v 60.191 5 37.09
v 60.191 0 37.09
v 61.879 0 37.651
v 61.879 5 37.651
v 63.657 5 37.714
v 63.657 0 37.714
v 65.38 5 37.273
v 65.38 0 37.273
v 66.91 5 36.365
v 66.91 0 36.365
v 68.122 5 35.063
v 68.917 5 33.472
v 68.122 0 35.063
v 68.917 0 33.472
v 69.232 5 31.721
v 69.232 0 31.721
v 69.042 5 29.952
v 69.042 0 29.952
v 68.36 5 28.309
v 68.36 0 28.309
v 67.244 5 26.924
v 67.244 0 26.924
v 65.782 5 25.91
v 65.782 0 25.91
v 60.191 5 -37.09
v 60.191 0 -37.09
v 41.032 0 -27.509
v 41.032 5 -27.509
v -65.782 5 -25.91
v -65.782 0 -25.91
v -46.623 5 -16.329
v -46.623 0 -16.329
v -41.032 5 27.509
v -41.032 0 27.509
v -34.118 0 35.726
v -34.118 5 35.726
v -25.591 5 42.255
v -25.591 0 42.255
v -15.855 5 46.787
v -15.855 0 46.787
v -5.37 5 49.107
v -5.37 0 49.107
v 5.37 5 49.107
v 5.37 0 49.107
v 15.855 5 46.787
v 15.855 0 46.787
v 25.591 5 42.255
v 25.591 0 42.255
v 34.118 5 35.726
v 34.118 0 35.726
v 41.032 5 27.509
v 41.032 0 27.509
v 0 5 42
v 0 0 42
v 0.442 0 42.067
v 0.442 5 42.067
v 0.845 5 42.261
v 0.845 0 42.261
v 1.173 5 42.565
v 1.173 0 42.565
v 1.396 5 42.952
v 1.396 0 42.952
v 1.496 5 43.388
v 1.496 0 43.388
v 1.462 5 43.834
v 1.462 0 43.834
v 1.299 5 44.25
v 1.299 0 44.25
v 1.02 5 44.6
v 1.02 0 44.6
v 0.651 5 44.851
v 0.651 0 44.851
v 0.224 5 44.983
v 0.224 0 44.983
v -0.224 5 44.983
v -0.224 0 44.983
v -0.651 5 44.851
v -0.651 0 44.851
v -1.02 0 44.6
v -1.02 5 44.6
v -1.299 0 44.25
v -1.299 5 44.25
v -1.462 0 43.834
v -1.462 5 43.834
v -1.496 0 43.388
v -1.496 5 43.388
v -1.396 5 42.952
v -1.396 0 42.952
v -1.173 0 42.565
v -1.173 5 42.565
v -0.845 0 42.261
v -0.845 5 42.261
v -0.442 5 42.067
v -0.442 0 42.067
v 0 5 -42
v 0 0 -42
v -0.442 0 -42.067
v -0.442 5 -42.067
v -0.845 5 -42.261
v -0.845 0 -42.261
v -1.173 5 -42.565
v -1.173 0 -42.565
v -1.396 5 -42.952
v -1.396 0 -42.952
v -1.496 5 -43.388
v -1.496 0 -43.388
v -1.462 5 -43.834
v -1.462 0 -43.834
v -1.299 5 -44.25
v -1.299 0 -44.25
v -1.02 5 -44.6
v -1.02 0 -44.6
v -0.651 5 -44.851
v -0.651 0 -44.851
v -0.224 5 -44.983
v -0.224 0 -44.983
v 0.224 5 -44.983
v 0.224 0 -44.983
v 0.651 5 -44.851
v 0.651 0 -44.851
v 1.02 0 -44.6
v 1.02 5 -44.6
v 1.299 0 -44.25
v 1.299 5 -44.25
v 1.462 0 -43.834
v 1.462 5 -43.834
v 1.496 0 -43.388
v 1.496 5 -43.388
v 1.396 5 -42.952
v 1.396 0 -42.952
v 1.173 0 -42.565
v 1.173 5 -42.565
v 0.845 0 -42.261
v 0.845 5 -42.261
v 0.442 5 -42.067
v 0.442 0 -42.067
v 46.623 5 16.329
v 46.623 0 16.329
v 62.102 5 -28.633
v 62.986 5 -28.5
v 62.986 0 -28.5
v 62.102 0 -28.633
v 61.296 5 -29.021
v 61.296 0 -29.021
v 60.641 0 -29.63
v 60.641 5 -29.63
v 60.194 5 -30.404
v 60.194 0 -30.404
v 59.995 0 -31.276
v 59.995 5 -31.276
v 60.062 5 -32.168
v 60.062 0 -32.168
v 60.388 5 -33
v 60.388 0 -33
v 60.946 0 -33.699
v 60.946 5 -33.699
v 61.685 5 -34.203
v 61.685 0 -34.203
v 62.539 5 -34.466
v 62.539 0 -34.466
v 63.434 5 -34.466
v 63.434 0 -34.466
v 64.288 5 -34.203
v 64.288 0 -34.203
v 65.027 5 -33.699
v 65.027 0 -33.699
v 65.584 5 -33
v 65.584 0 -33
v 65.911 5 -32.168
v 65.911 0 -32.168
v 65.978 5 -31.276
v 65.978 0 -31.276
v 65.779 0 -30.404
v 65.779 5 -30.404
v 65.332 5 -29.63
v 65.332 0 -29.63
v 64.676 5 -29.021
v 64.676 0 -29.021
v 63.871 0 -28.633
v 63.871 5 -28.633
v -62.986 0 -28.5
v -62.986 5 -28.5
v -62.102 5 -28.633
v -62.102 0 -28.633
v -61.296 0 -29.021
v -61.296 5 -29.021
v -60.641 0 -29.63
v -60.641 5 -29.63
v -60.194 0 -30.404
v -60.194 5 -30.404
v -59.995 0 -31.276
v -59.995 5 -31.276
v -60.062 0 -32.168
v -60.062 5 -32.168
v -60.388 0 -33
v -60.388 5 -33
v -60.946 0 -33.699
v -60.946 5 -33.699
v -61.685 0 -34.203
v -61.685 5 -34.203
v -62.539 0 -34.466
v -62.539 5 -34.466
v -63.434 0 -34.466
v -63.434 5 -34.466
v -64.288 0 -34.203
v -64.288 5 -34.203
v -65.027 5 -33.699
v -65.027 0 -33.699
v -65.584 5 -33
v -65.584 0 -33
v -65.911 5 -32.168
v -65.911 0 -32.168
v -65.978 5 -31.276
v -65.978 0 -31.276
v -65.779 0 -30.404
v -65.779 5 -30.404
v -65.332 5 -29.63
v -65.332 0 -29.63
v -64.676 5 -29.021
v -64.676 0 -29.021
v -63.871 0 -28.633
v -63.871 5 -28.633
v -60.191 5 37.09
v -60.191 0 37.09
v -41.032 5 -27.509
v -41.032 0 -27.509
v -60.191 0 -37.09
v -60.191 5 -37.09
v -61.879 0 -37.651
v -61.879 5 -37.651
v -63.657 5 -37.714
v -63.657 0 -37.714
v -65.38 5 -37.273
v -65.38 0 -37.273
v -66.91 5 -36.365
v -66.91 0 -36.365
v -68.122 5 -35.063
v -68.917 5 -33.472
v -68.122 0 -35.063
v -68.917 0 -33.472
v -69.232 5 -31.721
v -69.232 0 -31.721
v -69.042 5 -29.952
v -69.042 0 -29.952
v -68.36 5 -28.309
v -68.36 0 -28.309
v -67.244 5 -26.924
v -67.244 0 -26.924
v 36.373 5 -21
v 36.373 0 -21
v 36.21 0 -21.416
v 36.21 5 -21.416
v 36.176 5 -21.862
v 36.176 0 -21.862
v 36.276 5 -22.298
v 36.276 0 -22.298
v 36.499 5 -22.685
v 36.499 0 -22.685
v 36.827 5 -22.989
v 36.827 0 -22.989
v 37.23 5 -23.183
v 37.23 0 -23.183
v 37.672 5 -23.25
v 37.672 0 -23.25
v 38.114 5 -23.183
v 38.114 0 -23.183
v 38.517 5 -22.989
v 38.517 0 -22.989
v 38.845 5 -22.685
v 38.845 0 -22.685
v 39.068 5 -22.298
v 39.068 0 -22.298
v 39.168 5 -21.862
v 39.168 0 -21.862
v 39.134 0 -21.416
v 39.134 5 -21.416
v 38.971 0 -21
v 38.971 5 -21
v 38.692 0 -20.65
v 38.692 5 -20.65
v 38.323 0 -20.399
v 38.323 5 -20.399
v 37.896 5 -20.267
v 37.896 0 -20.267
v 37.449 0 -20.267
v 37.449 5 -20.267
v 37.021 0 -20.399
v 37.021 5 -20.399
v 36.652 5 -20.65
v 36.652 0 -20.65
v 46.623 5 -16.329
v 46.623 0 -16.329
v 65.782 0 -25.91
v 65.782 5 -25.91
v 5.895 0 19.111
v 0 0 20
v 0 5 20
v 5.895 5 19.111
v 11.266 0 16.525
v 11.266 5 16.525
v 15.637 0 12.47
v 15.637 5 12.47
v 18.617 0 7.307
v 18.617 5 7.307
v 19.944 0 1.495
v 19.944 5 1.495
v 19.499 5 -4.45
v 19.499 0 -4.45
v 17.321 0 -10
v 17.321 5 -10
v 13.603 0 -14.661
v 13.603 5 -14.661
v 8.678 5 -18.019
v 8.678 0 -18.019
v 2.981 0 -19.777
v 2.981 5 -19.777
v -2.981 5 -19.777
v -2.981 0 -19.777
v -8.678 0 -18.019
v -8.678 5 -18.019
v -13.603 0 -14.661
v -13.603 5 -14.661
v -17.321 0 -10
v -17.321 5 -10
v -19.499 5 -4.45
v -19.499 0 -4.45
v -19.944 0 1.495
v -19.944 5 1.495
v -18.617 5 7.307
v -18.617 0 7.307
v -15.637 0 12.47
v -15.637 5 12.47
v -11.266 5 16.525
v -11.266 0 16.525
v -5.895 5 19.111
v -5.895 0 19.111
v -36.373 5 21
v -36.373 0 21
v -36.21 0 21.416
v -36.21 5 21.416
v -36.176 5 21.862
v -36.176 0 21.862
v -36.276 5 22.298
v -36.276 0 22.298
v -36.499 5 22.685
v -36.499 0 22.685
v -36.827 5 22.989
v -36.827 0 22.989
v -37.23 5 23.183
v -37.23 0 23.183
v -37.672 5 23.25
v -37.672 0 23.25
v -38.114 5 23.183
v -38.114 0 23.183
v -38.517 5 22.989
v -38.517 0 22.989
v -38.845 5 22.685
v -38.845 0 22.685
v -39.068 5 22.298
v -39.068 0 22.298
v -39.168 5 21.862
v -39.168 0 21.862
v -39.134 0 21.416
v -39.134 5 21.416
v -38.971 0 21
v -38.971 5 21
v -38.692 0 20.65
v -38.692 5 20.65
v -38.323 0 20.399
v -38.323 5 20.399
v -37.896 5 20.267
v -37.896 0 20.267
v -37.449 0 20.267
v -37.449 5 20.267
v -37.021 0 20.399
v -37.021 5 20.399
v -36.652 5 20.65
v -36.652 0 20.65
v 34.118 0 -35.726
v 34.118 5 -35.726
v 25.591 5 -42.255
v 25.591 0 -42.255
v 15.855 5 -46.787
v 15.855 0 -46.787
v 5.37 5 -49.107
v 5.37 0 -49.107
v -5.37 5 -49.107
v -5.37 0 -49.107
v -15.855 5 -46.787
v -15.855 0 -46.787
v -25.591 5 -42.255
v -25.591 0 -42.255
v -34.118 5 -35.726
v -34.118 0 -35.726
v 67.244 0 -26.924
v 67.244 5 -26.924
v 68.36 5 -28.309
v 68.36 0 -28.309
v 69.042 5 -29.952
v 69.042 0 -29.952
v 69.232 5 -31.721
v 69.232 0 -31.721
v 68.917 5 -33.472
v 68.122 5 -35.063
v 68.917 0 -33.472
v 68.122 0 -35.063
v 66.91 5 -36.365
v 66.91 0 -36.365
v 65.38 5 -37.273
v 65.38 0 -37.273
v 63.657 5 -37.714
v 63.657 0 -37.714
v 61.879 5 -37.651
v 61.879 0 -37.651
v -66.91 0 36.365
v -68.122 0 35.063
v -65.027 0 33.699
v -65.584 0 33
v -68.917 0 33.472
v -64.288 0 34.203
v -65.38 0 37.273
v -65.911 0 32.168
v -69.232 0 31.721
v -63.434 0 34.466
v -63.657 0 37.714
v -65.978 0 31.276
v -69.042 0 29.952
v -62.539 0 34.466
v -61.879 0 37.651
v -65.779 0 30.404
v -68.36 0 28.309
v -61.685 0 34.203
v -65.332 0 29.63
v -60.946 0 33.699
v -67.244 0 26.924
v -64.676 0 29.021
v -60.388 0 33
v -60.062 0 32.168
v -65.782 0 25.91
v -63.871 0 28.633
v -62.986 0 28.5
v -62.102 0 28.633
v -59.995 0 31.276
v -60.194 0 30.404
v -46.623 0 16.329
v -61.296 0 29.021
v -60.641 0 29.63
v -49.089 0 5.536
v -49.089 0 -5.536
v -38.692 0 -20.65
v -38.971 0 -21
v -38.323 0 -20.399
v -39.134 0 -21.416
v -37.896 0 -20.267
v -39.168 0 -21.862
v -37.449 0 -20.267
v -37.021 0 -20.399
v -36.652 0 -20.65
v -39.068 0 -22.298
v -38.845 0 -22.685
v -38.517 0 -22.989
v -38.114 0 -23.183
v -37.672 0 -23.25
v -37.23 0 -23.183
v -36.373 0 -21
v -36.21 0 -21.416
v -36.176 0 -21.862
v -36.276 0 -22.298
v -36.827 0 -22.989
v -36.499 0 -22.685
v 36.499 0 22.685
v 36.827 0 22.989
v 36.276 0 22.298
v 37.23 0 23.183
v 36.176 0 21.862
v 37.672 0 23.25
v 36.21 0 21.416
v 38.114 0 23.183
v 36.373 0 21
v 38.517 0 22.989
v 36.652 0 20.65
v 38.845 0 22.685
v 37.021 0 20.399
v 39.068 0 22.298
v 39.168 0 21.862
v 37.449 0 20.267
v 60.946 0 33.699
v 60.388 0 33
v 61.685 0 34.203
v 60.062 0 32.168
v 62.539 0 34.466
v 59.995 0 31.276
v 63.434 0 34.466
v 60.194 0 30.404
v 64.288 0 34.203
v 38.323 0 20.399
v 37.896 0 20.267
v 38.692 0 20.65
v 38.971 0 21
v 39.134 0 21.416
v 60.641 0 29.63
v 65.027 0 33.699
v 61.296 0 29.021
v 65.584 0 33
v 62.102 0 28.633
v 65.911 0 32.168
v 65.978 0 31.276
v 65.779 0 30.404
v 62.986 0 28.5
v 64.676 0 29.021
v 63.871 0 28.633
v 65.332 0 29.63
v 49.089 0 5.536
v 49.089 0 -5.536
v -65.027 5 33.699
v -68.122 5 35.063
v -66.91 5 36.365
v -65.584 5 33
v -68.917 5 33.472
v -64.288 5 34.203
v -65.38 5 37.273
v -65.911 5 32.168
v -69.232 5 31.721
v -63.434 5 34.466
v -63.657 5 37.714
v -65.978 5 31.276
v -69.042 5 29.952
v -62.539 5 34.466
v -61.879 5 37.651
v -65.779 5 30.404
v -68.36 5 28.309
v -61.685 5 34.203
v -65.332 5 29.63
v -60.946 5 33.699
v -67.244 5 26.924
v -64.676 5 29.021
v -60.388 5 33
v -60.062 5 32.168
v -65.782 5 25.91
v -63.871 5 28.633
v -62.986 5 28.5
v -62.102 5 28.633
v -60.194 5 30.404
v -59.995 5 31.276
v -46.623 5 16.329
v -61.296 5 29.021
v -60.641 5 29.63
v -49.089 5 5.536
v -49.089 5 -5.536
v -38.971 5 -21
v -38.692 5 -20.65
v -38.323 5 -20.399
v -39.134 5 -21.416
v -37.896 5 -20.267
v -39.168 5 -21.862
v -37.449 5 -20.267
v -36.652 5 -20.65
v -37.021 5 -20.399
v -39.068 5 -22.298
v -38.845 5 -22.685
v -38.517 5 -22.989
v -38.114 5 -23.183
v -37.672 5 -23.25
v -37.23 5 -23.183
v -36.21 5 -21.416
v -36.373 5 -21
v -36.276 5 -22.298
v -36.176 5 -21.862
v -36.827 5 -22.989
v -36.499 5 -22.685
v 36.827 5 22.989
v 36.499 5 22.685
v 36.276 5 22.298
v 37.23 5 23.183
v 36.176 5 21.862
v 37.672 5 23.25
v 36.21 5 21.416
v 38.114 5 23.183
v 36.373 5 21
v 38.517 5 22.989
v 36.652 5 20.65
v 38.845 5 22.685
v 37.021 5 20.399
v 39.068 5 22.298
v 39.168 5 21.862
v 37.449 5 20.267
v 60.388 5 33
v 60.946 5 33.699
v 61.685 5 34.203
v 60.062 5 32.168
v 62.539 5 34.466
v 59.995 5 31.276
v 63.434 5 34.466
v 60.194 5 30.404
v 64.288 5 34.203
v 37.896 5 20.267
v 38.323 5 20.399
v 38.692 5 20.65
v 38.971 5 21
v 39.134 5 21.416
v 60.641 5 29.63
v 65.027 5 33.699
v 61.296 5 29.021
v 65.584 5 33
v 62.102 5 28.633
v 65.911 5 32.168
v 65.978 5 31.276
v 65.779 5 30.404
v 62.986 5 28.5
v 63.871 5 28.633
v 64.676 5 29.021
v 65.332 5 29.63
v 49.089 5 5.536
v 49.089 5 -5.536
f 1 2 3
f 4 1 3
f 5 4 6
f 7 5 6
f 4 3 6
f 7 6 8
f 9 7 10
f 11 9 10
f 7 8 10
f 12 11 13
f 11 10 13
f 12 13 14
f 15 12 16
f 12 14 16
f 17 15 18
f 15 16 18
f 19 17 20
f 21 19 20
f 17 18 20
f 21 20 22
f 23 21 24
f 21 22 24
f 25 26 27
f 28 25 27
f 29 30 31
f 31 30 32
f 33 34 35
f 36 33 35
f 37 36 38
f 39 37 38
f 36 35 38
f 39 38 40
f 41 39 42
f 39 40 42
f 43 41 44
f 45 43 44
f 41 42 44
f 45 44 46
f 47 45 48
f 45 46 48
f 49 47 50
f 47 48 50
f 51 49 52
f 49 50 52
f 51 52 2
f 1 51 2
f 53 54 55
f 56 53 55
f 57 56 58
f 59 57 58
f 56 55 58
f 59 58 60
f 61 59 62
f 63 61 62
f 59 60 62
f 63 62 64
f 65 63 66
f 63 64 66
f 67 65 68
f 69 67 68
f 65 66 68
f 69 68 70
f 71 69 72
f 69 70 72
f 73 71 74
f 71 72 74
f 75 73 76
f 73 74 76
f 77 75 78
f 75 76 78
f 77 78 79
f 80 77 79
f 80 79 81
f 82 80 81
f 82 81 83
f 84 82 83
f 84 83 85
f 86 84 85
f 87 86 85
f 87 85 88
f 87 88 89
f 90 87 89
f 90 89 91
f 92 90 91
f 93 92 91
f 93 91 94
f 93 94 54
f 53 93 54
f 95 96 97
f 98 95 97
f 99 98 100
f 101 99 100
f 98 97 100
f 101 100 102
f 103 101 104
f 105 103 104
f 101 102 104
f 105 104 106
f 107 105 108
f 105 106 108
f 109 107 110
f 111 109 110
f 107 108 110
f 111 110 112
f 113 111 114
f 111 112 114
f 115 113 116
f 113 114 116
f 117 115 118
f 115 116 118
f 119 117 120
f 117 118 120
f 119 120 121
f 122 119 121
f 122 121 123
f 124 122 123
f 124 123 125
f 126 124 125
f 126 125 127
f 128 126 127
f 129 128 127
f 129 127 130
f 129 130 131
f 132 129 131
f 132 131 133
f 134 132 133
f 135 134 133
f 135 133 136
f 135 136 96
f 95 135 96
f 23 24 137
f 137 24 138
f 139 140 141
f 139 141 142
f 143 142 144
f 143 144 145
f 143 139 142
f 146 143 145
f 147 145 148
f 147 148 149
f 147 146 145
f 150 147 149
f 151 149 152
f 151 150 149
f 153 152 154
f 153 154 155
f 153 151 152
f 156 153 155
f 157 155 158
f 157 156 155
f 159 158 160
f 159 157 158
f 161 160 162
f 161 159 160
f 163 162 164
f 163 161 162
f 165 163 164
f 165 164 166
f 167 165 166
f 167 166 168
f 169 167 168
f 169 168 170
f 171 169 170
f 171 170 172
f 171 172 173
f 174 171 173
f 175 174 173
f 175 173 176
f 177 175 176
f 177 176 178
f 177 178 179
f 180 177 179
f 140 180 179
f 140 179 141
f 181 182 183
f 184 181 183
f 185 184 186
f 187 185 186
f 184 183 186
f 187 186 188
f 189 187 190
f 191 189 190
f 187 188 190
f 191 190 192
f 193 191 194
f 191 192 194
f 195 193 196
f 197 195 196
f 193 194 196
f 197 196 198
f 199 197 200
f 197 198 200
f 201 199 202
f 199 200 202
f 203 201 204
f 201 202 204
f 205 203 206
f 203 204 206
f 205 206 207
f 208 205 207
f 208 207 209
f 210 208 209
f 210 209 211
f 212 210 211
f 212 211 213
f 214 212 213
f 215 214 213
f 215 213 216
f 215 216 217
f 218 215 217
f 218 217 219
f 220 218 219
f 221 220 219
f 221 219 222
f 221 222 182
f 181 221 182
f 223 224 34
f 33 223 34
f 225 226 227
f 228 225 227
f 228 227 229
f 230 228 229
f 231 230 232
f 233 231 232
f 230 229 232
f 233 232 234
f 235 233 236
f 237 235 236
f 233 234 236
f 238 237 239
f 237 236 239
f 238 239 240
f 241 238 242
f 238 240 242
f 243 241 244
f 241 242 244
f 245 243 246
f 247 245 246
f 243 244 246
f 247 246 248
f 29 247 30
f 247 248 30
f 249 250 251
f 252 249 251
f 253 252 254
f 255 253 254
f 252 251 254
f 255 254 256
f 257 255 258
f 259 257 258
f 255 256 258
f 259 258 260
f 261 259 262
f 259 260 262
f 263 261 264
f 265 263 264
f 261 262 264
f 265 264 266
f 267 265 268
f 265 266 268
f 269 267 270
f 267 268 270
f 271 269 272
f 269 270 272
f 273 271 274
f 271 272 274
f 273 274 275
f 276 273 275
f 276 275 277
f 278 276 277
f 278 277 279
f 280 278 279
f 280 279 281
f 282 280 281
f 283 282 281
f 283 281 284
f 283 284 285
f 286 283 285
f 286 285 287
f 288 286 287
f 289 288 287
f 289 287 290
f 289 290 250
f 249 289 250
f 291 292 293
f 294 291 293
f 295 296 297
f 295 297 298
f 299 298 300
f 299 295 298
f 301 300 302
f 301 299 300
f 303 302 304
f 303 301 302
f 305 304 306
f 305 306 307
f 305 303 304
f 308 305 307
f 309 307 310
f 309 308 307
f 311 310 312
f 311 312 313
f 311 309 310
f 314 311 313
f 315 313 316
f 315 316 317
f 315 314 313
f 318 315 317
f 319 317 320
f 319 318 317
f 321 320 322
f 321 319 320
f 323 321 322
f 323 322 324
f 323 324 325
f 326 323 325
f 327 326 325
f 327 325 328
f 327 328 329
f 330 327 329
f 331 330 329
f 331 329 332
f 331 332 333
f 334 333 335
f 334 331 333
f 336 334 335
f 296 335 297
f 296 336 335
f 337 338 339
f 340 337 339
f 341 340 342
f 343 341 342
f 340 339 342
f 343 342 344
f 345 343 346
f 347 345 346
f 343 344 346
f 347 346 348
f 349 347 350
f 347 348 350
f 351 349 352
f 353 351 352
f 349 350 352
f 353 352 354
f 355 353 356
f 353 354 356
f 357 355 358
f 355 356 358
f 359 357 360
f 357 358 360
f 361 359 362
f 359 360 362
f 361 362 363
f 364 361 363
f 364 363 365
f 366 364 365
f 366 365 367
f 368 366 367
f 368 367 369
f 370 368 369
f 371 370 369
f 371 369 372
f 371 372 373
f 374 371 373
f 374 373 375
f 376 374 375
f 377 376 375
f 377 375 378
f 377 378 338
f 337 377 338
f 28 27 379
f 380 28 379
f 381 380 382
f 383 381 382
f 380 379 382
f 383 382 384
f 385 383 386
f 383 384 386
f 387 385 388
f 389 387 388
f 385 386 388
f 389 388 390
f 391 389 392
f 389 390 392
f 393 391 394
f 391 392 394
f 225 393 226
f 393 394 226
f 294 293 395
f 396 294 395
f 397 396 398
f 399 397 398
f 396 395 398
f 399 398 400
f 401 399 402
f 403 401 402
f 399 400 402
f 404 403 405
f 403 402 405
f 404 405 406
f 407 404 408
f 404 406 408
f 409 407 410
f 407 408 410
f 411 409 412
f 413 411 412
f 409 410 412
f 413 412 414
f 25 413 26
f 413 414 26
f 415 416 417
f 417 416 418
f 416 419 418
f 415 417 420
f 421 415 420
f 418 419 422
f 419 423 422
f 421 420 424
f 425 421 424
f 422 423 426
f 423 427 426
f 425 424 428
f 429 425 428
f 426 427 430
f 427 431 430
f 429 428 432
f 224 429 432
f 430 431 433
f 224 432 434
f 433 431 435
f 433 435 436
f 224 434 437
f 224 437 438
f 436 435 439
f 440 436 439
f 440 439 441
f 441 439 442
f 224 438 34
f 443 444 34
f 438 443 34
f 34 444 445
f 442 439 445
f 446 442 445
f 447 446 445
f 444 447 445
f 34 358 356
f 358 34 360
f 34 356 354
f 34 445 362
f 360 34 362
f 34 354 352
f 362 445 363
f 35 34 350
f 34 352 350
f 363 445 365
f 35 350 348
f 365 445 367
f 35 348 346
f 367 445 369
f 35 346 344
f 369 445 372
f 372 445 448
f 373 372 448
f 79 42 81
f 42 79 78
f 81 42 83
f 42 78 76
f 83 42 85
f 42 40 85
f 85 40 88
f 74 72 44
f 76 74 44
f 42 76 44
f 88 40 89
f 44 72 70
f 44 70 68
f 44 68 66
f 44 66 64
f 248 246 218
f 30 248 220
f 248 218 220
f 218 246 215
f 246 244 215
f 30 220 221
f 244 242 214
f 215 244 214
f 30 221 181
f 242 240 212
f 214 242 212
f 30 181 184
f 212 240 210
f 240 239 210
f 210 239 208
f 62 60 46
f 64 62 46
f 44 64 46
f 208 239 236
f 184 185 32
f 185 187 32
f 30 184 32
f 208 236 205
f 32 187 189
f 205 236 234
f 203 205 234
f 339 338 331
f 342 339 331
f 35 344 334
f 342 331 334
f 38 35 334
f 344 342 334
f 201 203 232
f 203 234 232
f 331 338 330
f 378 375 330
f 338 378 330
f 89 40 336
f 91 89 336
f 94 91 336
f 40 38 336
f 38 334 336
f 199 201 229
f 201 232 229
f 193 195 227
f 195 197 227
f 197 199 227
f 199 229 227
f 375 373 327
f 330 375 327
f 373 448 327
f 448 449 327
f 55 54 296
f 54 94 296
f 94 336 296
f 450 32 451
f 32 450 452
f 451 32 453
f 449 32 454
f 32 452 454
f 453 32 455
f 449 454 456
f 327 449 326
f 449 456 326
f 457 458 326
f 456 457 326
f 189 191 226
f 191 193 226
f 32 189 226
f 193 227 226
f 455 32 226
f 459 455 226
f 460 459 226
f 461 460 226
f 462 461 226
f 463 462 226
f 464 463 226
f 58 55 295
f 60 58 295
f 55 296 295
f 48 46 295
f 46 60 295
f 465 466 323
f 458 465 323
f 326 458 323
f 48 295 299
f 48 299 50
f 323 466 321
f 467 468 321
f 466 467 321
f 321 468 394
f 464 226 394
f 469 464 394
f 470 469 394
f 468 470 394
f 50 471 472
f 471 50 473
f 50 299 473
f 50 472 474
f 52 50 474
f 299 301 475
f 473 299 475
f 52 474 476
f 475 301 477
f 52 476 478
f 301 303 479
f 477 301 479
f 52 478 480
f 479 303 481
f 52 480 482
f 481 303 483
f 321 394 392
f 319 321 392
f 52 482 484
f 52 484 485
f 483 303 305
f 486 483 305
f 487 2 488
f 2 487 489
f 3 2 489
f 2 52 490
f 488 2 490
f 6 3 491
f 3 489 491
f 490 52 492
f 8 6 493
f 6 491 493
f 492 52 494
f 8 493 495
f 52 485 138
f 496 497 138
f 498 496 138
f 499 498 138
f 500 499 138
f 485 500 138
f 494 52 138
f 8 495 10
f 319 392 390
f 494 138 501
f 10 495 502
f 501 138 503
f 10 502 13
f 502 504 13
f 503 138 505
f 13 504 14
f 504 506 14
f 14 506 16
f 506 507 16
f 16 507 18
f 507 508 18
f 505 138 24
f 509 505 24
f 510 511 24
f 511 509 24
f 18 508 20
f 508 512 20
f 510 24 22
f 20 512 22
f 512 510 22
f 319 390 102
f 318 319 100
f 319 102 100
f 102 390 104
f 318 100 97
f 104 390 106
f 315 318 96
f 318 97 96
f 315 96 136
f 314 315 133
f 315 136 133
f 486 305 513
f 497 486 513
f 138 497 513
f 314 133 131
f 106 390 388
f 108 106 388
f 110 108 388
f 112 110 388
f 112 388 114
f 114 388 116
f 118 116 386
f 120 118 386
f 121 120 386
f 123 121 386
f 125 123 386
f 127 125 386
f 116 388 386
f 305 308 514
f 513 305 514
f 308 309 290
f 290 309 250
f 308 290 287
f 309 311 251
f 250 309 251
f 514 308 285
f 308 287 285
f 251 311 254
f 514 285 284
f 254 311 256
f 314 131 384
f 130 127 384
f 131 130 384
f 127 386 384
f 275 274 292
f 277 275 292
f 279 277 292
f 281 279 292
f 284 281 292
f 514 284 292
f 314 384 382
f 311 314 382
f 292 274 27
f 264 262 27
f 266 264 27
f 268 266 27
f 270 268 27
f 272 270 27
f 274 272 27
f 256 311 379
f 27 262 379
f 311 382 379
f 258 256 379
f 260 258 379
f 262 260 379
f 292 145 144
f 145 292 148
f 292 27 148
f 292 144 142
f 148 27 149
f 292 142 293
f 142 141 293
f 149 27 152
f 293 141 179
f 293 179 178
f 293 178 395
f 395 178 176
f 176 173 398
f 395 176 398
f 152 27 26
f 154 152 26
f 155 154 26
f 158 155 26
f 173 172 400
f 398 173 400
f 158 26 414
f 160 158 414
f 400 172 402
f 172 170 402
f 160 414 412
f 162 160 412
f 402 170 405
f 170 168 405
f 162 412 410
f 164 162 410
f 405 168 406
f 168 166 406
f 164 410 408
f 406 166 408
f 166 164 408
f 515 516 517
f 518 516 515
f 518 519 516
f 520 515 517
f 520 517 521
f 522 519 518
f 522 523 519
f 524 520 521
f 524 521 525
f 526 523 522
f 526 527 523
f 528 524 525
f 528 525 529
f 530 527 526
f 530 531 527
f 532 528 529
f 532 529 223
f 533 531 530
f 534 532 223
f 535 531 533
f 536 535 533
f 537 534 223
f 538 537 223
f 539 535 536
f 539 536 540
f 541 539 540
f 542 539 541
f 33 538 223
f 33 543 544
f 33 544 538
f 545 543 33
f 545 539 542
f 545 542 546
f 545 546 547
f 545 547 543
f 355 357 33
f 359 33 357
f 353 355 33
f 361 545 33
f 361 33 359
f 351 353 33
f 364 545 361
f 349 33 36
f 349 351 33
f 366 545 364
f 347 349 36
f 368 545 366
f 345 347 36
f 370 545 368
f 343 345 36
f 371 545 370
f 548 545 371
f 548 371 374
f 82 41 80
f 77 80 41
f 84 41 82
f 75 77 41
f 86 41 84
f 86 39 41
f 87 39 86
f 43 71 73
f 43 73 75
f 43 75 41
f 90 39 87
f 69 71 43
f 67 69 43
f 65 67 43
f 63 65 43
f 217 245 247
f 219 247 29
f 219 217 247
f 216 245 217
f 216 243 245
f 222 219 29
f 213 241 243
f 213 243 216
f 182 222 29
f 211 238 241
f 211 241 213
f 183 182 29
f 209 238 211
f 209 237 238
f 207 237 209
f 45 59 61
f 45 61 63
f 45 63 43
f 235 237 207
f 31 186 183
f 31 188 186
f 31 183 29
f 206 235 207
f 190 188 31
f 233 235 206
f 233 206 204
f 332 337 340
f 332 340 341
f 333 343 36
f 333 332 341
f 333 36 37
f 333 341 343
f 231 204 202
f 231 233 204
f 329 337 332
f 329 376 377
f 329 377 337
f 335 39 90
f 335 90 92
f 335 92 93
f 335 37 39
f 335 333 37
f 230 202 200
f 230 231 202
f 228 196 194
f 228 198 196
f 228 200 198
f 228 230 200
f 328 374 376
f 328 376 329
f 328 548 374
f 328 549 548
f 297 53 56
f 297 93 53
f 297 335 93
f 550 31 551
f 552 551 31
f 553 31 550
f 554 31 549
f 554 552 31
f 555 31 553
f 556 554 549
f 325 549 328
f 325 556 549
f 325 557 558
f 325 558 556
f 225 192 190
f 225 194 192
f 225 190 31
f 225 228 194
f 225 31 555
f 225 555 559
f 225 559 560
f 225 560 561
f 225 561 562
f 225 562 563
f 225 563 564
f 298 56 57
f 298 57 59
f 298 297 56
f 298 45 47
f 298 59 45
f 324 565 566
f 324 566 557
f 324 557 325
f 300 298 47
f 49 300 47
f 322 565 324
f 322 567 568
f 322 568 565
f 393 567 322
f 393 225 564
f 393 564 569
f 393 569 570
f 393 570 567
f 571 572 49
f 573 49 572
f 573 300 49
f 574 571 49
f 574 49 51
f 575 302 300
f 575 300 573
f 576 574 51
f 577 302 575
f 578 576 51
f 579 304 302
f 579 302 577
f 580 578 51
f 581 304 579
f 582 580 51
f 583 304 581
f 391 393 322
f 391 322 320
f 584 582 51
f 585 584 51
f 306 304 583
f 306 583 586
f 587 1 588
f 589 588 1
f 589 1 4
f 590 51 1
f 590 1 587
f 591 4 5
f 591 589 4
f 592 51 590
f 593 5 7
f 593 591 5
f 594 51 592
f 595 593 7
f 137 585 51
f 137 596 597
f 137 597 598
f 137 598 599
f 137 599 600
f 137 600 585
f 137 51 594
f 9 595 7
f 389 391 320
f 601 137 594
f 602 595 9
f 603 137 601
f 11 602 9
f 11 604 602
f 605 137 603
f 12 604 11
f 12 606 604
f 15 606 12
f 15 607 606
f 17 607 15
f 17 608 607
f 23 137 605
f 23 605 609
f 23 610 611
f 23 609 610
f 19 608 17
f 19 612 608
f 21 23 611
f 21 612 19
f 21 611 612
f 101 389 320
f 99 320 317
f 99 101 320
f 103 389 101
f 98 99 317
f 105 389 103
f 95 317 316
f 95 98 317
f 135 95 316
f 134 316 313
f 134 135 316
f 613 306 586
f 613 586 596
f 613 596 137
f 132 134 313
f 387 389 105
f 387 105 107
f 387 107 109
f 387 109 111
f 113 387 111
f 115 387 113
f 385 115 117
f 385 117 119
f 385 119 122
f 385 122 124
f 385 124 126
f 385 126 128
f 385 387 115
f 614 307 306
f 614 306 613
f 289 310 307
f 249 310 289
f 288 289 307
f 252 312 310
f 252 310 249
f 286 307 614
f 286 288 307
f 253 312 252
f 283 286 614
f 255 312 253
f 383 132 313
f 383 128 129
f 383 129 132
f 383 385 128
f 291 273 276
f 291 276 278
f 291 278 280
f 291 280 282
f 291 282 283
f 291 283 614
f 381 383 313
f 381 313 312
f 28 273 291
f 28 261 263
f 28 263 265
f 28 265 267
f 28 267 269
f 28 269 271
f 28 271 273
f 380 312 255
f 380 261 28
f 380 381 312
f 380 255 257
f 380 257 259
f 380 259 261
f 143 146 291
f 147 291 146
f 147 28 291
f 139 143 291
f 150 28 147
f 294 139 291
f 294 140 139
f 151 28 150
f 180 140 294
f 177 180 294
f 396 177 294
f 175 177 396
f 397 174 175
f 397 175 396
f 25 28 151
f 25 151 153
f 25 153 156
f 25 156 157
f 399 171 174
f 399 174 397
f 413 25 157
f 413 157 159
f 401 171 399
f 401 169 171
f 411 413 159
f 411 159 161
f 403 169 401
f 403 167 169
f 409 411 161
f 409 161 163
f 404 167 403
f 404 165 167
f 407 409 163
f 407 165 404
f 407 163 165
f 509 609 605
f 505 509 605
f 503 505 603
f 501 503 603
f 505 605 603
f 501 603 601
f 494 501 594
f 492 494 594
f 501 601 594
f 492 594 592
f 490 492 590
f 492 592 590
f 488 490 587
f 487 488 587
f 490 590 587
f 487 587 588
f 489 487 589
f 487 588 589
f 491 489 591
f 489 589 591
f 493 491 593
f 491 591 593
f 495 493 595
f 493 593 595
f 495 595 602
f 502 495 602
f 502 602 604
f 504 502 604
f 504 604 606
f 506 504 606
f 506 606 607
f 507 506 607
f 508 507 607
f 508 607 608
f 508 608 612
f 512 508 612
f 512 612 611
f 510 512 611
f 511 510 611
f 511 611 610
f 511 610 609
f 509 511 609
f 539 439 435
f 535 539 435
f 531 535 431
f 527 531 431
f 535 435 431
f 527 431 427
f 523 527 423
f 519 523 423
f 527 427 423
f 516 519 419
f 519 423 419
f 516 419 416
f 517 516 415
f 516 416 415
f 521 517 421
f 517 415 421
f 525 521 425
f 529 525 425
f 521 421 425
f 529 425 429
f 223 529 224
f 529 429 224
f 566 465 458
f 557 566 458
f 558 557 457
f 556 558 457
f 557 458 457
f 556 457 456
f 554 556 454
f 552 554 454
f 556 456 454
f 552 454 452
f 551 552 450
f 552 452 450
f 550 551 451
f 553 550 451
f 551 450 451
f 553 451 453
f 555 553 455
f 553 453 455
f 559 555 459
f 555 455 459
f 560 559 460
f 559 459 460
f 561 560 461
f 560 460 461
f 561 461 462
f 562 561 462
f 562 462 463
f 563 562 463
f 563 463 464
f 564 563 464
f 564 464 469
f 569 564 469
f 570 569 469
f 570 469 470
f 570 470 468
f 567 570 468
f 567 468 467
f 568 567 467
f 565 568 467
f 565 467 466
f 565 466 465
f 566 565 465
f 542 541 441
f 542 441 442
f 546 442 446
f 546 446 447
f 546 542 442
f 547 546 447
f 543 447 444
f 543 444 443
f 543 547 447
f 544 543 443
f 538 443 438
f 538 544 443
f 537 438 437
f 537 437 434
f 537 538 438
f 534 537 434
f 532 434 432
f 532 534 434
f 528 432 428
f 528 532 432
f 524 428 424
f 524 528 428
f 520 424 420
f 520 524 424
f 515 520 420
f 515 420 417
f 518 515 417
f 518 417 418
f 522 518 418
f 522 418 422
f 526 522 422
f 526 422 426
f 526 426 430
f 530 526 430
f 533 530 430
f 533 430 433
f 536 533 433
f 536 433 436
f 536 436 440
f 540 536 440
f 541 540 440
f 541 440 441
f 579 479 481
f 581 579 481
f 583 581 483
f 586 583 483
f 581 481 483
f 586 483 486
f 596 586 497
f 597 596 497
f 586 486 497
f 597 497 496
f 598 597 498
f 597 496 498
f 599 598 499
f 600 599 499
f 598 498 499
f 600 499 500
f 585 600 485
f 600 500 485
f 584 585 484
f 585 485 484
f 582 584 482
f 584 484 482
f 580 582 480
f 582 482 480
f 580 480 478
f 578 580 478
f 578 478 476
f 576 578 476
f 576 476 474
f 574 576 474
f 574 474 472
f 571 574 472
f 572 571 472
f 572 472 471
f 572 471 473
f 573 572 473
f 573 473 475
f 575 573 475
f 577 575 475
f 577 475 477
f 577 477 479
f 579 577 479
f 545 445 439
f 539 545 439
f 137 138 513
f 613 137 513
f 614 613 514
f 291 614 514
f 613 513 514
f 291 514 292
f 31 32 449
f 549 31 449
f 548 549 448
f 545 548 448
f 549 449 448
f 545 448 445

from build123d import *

# Parameters (mm, degrees)
SKETCH_1_R               = 20
EXTRUDE_1_DEPTH          = 5
CUT_EXTRUDE_1_REACH      = 87.2
SKETCH_2_R               = 3
MIRROR_2_COPY_1_REACH    = 87.2
MIRROR_2_COPY_1_SKETCH_R = 3
SKETCH_3_R               = 1.5
CUT_EXTRUDE_2_DEPTH      = 86.199993462
PATTERN_CIRCULAR_1_COUNT = 6


with BuildPart() as part:
    # 草图1 → 凸台-拉伸1 (new body)
    with BuildSketch(Plane(origin=(0, 0, 0), x_dir=(1, 0, 0), z_dir=(0, 1, 0))):
        with BuildLine():
            Line((46.623322285, 16.328680875), (65.781966365, 25.910071498))
            ThreePointArc((65.781966365, 25.910071498), (68.576327064, 34.295567803), (60.190830759, 37.089928502))
            Line((60.190830759, 37.089928502), (41.03218668, 27.50853788))
            ThreePointArc((41.03218668, 27.50853788), (0, 49.4), (-41.03218668, 27.50853788))
            Line((-41.03218668, 27.50853788), (-60.190830759, 37.089928502))
            ThreePointArc((-60.190830759, 37.089928502), (-68.576327064, 34.295567803), (-65.781966365, 25.910071498))
            Line((-65.781966365, 25.910071498), (-46.623322285, 16.328680875))
            ThreePointArc((-46.623322285, 16.328680875), (-49.4, 0), (-46.623322285, -16.328680875))
            Line((-46.623322285, -16.328680875), (-65.781966365, -25.910071498))
            ThreePointArc((-65.781966365, -25.910071498), (-68.576327064, -34.295567803), (-60.190830759, -37.089928502))
            Line((-60.190830759, -37.089928502), (-41.03218668, -27.50853788))
            ThreePointArc((-41.03218668, -27.50853788), (0, -49.4), (41.03218668, -27.50853788))
            Line((41.03218668, -27.50853788), (60.190830759, -37.089928502))
            ThreePointArc((60.190830759, -37.089928502), (68.576327064, -34.295567803), (65.781966365, -25.910071498))
            Line((65.781966365, -25.910071498), (46.623322285, -16.328680875))
            ThreePointArc((46.623322285, -16.328680875), (49.4, 0), (46.623322285, 16.328680875))
        make_face()
        with Locations(Location((0, 0, 0), (0, 0, 270))):
            Circle(SKETCH_1_R, mode=Mode.SUBTRACT)
    extrude(amount=EXTRUDE_1_DEPTH)

    # 草图2 → 切除-拉伸1 (cut, up to next)
    with BuildSketch(Plane(origin=(0, 5, 0), x_dir=(1, 0, 0), z_dir=(0, 1, 0)), mode=Mode.PRIVATE) as cut_extrude_1_sk1:
        with Locations(Location((-62.986398562, 31.5, 0), (0, 0, 270))):
            Circle(SKETCH_2_R)
    cut_extrude_1_tool1 = extrude(cut_extrude_1_sk1.sketch, amount=-CUT_EXTRUDE_1_REACH, mode=Mode.PRIVATE) & part.part
    cut_extrude_1 = cut_extrude_1_tool1.solids().sort_by_distance((-62.986399, 5, -31.5))[0]
    add(cut_extrude_1, mode=Mode.SUBTRACT)

    # 镜向1: 切除-拉伸1 across plane
    add(cut_extrude_1.mirror(Plane.XY), mode=Mode.SUBTRACT)

    # 镜向2: 切除-拉伸1 across plane
    add(cut_extrude_1.mirror(Plane(origin=(0, 0, 0), x_dir=(0, 0, 1), z_dir=(1, 0, 0))), mode=Mode.SUBTRACT)

    # 镜向2 copy 1 sketch → 镜向2 copy 1 (cut, up to next)
    with BuildSketch(Plane(origin=(0, 5, 0), x_dir=(-1, 0, 0), z_dir=(0, 1, 0)), mode=Mode.PRIVATE) as mirror_2_copy_1_sk1:
        with Locations(Location((-62.986398562, 31.5, 0), (0, 0, 270))):
            Circle(MIRROR_2_COPY_1_SKETCH_R)
    mirror_2_copy_1_tool1 = extrude(mirror_2_copy_1_sk1.sketch, amount=-MIRROR_2_COPY_1_REACH, mode=Mode.PRIVATE) & part.part
    add(mirror_2_copy_1_tool1.solids().sort_by_distance((62.986399, 5, 31.5))[0], mode=Mode.SUBTRACT)

    # 草图3 → 切除-拉伸2 (cut, through all)
    with BuildSketch(Plane.XZ):
        with Locations(Location((0, 43.5, 0), (0, 0, 270))):
            Circle(SKETCH_3_R)
    cut_extrude_2 = extrude(amount=-CUT_EXTRUDE_2_DEPTH, mode=Mode.SUBTRACT)

    # 阵列(圆周)1: 切除-拉伸2 ×6 about axis
    pattern_circular_1_axis = Axis((0, 0, 0), (0, 1, 0))
    for i in range(1, PATTERN_CIRCULAR_1_COUNT):
        add(cut_extrude_2.rotate(pattern_circular_1_axis, i * 360 / PATTERN_CIRCULAR_1_COUNT), mode=Mode.SUBTRACT)


solid = part.part
